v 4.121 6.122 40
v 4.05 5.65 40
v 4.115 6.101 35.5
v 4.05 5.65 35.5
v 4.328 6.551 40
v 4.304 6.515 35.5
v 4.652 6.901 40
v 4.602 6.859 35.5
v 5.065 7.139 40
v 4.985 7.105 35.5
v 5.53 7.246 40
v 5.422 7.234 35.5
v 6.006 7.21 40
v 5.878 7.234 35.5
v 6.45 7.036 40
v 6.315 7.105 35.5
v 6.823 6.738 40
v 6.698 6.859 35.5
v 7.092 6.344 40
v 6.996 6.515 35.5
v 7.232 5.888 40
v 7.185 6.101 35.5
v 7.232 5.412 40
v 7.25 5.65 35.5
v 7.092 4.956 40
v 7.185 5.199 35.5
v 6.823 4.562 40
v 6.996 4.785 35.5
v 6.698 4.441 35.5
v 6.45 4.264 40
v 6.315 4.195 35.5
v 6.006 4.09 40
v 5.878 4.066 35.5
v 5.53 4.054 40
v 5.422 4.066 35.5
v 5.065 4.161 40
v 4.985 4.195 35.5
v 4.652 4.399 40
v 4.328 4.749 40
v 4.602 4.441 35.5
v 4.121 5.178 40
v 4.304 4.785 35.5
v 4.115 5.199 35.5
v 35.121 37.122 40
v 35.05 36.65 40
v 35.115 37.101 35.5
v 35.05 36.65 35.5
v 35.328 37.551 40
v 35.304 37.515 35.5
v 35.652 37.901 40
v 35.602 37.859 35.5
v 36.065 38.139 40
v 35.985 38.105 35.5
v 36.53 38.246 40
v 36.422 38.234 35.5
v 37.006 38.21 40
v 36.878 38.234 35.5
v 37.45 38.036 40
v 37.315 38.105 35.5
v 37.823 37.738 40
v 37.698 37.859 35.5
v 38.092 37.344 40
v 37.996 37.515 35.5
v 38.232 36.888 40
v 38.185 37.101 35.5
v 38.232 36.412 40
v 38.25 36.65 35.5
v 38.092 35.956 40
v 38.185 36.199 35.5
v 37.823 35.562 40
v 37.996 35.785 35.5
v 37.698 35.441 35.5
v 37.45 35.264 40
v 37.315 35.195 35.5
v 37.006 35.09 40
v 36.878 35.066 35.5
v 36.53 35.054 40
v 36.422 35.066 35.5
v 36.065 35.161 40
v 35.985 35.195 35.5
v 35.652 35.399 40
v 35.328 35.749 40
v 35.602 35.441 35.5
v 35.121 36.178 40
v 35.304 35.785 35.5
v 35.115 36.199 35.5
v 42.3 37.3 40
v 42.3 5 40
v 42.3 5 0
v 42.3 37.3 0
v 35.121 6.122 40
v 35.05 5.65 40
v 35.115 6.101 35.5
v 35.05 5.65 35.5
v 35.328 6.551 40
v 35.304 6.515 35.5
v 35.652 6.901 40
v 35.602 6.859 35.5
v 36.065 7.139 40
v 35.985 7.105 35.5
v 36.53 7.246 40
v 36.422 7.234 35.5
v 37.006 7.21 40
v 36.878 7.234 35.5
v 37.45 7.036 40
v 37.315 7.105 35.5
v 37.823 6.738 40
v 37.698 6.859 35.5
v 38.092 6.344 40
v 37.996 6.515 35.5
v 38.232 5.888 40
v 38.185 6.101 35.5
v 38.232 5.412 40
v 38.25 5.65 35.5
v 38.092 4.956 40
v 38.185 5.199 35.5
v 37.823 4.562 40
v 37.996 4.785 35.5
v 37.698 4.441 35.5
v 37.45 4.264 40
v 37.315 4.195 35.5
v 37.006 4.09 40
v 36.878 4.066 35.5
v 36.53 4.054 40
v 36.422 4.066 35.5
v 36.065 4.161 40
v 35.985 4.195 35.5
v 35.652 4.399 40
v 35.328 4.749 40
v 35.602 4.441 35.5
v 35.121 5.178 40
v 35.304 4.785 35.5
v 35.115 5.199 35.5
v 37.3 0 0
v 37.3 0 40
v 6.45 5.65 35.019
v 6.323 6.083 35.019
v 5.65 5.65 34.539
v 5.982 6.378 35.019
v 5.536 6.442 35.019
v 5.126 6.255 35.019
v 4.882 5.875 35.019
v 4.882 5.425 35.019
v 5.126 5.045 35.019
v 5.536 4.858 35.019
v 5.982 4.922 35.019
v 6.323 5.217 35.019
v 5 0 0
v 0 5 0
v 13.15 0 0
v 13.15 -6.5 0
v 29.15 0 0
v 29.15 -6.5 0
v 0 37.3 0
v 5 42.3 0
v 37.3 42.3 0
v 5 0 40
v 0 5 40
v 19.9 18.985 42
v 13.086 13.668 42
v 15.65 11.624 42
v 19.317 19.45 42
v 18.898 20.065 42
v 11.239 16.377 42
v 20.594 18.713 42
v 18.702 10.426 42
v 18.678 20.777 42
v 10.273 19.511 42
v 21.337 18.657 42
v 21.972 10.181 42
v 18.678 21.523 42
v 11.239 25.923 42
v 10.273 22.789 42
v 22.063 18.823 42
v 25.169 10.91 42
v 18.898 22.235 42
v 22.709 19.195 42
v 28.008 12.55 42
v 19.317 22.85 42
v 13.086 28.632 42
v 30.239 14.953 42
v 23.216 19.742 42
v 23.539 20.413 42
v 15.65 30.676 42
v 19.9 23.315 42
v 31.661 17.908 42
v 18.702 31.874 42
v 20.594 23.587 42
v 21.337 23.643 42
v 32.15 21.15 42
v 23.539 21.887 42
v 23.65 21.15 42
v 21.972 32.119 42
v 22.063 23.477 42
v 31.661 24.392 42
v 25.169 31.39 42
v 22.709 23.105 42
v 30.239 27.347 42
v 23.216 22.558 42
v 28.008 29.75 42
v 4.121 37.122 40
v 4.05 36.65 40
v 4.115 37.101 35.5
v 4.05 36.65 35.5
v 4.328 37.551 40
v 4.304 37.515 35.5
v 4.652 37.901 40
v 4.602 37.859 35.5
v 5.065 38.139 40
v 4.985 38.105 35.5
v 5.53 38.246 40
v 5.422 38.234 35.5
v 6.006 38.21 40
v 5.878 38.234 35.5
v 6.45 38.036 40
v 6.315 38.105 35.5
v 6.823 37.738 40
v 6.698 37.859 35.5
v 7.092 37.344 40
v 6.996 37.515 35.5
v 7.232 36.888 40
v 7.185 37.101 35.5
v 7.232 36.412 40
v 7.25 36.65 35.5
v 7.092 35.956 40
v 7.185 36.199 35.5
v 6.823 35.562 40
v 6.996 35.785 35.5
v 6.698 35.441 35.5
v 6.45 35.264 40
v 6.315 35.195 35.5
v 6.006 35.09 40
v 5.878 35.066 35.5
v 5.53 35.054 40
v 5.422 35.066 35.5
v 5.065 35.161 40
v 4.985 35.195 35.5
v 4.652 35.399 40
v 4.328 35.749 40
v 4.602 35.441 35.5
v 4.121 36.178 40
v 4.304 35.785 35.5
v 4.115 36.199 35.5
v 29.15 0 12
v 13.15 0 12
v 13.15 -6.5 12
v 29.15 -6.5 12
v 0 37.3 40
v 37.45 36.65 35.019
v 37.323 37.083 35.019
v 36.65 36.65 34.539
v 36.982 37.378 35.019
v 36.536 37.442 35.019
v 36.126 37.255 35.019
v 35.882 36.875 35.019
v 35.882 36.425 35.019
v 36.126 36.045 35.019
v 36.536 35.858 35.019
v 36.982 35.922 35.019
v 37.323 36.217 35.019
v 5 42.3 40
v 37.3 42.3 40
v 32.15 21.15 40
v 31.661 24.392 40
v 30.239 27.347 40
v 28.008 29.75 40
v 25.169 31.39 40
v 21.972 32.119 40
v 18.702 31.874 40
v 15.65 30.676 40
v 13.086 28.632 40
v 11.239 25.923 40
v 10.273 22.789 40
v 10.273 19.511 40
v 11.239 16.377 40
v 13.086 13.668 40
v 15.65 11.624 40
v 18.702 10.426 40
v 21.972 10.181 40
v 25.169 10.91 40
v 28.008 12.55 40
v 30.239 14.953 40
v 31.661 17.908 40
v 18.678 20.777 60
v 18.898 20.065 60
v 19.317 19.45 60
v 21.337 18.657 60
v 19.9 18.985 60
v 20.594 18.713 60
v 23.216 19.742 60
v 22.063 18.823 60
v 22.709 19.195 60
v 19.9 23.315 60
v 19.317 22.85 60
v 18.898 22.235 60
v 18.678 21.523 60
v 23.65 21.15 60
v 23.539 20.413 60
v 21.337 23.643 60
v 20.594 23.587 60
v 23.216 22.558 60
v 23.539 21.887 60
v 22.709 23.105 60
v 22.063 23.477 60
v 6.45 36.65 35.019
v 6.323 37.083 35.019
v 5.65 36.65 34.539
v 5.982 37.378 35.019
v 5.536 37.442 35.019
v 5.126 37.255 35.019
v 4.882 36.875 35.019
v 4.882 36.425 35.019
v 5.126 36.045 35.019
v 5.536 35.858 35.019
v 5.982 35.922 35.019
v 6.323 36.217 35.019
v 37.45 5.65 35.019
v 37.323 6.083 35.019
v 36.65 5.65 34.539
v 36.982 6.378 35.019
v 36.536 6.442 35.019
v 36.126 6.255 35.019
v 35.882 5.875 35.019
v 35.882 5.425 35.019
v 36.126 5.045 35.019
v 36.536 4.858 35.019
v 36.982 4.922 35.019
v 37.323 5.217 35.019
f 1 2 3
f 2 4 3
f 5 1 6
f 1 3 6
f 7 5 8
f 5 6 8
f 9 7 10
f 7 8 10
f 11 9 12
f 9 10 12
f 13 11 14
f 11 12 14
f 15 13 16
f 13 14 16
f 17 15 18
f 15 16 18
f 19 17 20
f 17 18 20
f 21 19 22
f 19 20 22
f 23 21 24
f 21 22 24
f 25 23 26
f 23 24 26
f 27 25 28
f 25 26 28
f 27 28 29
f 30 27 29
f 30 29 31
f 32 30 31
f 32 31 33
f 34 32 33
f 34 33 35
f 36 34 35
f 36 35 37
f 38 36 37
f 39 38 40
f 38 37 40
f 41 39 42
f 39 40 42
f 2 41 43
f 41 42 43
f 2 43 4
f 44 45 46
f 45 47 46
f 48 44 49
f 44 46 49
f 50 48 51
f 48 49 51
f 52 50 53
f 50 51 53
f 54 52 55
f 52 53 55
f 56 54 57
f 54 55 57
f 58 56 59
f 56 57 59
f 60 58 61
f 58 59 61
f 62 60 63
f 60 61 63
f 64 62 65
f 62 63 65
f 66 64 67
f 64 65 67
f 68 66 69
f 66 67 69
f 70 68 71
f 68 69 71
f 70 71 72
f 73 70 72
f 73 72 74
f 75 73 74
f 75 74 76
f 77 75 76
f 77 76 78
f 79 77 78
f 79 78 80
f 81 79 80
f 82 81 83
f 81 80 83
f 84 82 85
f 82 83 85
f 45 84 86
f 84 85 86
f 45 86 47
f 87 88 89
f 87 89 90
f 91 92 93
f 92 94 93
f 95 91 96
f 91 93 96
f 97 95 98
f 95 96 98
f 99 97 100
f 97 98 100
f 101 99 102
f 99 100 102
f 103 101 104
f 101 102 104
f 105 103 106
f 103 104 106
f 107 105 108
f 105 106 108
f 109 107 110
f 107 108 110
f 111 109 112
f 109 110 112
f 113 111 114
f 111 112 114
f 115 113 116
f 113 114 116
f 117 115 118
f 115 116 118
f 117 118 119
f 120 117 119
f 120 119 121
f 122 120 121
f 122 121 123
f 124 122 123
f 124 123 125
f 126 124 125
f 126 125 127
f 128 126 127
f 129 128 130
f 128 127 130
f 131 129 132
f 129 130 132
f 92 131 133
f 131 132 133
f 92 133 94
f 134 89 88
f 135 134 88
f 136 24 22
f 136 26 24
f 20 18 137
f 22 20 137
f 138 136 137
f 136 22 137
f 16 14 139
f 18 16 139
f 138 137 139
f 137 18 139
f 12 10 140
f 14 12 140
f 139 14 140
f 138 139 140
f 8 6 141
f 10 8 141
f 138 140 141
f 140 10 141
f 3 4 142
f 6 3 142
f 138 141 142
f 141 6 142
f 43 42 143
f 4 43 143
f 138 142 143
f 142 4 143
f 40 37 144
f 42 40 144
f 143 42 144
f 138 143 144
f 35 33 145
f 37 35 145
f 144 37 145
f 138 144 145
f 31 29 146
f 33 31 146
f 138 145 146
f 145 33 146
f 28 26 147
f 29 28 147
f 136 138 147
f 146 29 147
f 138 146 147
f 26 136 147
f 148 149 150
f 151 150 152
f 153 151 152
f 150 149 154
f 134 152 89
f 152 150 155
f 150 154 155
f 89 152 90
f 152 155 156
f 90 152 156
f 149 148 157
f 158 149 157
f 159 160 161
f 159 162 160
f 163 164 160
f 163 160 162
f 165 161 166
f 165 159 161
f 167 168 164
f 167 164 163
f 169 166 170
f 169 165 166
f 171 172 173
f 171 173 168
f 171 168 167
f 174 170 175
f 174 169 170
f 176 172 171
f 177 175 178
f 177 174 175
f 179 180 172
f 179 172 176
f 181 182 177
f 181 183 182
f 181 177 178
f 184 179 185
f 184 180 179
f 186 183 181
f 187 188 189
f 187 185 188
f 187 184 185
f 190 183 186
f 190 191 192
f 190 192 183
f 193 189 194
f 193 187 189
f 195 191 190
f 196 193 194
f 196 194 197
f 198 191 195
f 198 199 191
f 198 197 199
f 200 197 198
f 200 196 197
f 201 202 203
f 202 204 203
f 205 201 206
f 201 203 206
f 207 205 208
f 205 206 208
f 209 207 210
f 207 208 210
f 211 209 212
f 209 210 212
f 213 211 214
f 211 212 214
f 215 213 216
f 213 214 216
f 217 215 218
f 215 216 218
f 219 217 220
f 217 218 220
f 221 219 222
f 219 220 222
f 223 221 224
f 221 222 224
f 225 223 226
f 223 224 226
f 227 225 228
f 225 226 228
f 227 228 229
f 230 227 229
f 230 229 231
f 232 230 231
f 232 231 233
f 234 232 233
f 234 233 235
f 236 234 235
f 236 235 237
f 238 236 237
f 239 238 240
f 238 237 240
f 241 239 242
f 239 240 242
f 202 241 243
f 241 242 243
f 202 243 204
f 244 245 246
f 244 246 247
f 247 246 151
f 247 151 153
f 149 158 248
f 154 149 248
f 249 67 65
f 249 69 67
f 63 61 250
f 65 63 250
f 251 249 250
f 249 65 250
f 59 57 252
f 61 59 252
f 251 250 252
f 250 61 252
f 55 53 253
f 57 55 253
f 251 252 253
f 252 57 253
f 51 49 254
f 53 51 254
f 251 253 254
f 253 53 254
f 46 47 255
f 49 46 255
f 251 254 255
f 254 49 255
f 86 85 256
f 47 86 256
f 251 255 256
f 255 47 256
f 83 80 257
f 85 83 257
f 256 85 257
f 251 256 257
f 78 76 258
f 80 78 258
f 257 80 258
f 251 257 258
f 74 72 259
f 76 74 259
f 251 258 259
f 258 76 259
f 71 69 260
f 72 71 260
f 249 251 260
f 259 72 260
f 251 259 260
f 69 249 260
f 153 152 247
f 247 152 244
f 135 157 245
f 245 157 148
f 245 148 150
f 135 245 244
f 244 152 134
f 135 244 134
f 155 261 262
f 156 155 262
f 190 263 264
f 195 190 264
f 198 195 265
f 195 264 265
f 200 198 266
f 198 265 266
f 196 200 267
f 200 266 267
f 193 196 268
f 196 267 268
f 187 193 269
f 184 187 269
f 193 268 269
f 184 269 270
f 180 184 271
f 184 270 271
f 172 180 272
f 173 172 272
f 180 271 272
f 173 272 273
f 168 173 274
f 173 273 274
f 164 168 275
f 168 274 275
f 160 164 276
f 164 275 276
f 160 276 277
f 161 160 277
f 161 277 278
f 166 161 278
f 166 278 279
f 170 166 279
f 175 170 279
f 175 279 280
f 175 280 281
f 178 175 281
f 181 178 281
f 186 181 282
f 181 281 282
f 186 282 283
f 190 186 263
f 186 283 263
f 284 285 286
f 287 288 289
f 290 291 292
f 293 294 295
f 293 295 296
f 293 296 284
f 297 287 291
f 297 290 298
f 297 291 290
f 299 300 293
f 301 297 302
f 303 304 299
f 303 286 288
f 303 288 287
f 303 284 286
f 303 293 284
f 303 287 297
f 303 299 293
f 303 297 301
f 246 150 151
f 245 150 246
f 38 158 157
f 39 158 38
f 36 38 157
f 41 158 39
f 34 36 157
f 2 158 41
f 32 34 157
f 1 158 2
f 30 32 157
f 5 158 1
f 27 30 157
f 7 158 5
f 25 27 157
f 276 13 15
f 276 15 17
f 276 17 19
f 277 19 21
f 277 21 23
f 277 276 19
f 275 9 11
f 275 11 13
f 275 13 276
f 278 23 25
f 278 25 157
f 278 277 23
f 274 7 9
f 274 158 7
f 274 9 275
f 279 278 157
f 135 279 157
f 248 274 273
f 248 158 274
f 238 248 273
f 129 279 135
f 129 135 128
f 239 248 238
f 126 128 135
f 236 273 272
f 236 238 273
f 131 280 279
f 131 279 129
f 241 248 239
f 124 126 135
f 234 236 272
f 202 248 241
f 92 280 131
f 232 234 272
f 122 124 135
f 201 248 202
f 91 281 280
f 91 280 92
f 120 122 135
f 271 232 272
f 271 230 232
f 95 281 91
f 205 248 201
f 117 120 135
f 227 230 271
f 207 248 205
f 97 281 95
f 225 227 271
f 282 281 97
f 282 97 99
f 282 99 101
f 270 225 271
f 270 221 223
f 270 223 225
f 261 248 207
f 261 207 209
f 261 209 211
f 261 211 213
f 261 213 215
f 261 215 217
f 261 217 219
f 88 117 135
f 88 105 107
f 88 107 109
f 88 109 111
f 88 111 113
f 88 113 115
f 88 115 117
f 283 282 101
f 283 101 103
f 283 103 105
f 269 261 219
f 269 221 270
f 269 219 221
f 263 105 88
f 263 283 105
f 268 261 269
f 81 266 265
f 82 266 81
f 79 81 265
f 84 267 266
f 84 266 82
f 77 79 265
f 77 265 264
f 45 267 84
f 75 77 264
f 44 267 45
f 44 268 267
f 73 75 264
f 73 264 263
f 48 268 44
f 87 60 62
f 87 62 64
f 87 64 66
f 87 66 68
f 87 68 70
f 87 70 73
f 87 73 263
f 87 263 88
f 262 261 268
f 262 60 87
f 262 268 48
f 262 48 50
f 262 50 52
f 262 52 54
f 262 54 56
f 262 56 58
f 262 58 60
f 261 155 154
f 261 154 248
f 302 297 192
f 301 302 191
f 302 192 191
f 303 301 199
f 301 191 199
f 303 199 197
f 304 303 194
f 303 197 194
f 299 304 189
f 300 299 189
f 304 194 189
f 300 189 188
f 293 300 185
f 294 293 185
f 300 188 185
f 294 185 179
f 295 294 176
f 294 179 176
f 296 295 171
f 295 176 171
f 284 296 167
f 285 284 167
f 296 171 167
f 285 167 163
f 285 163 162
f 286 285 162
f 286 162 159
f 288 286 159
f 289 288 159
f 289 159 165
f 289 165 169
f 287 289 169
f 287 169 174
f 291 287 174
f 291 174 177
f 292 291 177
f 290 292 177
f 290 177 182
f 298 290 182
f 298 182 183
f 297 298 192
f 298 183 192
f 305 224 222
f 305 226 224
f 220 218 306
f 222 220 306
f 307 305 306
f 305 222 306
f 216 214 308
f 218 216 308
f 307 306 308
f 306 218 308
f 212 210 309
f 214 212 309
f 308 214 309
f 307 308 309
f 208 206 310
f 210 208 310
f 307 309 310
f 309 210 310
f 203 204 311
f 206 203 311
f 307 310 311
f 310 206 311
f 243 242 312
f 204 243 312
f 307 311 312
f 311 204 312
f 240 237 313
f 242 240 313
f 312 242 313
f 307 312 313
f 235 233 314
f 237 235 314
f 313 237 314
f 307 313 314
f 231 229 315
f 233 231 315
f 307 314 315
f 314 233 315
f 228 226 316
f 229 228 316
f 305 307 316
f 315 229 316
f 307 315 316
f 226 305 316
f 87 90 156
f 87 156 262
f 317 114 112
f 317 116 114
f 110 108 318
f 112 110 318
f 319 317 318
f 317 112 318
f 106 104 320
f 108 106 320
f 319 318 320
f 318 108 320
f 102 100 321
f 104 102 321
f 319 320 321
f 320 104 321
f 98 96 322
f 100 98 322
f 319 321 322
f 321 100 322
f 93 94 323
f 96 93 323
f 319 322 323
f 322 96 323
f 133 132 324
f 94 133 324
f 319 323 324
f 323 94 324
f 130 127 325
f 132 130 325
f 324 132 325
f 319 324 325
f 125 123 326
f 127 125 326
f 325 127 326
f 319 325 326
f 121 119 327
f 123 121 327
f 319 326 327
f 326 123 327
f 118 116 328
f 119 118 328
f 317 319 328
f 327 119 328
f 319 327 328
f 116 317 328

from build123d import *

# Parameters (mm, degrees)
F0_W      = 42.3
F0_H      = 42.3
F1_DEPTH  = 40
F3_D      = 3.2
F3_DEPTH  = 4.5
F3_TIP    = 0.9613769904
F4_R      = 11
F5_DEPTH  = 2
F6_R      = 2.5
F7_DEPTH  = 18
F8_SIZE   = 5
F9_W      = 16
F9_H      = 12
F10_DEPTH = 6.5


with BuildPart() as f1:
    # F0 (on Top) → F1 (new body)
    with BuildSketch(Plane.XY):
        with Locations((21.15, 21.15)):
            Rectangle(F0_W, F0_H)
    extrude(amount=F1_DEPTH)

    # F3
    with Locations(Plane.XY.offset(40)):
        with Locations((5.65, 36.65), (36.65, 36.65), (5.65, 5.65), (36.65, 5.65)):
            Hole(F3_D / 2, depth=F3_DEPTH)
            with Locations((0, 0, -(F3_DEPTH + F3_TIP / 2))):  # 118° drill point
                Cone(0, F3_D / 2, F3_TIP, mode=Mode.SUBTRACT)

    # F4 (on face) → F5 (join)
    with BuildSketch(Plane.XY.offset(40)):
        with Locations((21.15, 21.15)):
            Circle(F4_R)
    extrude(amount=F5_DEPTH)

    # F6 (on face) → F7 (join)
    with BuildSketch(Plane.XY.offset(42)):
        with Locations((21.15, 21.15)):
            Circle(F6_R)
    extrude(amount=F7_DEPTH)

    # F8
    f8_edges = [f1.edges().sort_by_distance(p)[0] for p in [
        (42.3, 42.3, 20),
        (42.3, 0, 20),
        (0, 42.3, 20),
        (0, 0, 20),
    ]]
    chamfer(f8_edges, length=F8_SIZE)

    # F9 (on face) → F10 (join)
    with BuildSketch(Plane.XZ):
        with Locations((21.15, 6)):
            Rectangle(F9_W, F9_H)
    extrude(amount=F10_DEPTH)


solid = f1.part
